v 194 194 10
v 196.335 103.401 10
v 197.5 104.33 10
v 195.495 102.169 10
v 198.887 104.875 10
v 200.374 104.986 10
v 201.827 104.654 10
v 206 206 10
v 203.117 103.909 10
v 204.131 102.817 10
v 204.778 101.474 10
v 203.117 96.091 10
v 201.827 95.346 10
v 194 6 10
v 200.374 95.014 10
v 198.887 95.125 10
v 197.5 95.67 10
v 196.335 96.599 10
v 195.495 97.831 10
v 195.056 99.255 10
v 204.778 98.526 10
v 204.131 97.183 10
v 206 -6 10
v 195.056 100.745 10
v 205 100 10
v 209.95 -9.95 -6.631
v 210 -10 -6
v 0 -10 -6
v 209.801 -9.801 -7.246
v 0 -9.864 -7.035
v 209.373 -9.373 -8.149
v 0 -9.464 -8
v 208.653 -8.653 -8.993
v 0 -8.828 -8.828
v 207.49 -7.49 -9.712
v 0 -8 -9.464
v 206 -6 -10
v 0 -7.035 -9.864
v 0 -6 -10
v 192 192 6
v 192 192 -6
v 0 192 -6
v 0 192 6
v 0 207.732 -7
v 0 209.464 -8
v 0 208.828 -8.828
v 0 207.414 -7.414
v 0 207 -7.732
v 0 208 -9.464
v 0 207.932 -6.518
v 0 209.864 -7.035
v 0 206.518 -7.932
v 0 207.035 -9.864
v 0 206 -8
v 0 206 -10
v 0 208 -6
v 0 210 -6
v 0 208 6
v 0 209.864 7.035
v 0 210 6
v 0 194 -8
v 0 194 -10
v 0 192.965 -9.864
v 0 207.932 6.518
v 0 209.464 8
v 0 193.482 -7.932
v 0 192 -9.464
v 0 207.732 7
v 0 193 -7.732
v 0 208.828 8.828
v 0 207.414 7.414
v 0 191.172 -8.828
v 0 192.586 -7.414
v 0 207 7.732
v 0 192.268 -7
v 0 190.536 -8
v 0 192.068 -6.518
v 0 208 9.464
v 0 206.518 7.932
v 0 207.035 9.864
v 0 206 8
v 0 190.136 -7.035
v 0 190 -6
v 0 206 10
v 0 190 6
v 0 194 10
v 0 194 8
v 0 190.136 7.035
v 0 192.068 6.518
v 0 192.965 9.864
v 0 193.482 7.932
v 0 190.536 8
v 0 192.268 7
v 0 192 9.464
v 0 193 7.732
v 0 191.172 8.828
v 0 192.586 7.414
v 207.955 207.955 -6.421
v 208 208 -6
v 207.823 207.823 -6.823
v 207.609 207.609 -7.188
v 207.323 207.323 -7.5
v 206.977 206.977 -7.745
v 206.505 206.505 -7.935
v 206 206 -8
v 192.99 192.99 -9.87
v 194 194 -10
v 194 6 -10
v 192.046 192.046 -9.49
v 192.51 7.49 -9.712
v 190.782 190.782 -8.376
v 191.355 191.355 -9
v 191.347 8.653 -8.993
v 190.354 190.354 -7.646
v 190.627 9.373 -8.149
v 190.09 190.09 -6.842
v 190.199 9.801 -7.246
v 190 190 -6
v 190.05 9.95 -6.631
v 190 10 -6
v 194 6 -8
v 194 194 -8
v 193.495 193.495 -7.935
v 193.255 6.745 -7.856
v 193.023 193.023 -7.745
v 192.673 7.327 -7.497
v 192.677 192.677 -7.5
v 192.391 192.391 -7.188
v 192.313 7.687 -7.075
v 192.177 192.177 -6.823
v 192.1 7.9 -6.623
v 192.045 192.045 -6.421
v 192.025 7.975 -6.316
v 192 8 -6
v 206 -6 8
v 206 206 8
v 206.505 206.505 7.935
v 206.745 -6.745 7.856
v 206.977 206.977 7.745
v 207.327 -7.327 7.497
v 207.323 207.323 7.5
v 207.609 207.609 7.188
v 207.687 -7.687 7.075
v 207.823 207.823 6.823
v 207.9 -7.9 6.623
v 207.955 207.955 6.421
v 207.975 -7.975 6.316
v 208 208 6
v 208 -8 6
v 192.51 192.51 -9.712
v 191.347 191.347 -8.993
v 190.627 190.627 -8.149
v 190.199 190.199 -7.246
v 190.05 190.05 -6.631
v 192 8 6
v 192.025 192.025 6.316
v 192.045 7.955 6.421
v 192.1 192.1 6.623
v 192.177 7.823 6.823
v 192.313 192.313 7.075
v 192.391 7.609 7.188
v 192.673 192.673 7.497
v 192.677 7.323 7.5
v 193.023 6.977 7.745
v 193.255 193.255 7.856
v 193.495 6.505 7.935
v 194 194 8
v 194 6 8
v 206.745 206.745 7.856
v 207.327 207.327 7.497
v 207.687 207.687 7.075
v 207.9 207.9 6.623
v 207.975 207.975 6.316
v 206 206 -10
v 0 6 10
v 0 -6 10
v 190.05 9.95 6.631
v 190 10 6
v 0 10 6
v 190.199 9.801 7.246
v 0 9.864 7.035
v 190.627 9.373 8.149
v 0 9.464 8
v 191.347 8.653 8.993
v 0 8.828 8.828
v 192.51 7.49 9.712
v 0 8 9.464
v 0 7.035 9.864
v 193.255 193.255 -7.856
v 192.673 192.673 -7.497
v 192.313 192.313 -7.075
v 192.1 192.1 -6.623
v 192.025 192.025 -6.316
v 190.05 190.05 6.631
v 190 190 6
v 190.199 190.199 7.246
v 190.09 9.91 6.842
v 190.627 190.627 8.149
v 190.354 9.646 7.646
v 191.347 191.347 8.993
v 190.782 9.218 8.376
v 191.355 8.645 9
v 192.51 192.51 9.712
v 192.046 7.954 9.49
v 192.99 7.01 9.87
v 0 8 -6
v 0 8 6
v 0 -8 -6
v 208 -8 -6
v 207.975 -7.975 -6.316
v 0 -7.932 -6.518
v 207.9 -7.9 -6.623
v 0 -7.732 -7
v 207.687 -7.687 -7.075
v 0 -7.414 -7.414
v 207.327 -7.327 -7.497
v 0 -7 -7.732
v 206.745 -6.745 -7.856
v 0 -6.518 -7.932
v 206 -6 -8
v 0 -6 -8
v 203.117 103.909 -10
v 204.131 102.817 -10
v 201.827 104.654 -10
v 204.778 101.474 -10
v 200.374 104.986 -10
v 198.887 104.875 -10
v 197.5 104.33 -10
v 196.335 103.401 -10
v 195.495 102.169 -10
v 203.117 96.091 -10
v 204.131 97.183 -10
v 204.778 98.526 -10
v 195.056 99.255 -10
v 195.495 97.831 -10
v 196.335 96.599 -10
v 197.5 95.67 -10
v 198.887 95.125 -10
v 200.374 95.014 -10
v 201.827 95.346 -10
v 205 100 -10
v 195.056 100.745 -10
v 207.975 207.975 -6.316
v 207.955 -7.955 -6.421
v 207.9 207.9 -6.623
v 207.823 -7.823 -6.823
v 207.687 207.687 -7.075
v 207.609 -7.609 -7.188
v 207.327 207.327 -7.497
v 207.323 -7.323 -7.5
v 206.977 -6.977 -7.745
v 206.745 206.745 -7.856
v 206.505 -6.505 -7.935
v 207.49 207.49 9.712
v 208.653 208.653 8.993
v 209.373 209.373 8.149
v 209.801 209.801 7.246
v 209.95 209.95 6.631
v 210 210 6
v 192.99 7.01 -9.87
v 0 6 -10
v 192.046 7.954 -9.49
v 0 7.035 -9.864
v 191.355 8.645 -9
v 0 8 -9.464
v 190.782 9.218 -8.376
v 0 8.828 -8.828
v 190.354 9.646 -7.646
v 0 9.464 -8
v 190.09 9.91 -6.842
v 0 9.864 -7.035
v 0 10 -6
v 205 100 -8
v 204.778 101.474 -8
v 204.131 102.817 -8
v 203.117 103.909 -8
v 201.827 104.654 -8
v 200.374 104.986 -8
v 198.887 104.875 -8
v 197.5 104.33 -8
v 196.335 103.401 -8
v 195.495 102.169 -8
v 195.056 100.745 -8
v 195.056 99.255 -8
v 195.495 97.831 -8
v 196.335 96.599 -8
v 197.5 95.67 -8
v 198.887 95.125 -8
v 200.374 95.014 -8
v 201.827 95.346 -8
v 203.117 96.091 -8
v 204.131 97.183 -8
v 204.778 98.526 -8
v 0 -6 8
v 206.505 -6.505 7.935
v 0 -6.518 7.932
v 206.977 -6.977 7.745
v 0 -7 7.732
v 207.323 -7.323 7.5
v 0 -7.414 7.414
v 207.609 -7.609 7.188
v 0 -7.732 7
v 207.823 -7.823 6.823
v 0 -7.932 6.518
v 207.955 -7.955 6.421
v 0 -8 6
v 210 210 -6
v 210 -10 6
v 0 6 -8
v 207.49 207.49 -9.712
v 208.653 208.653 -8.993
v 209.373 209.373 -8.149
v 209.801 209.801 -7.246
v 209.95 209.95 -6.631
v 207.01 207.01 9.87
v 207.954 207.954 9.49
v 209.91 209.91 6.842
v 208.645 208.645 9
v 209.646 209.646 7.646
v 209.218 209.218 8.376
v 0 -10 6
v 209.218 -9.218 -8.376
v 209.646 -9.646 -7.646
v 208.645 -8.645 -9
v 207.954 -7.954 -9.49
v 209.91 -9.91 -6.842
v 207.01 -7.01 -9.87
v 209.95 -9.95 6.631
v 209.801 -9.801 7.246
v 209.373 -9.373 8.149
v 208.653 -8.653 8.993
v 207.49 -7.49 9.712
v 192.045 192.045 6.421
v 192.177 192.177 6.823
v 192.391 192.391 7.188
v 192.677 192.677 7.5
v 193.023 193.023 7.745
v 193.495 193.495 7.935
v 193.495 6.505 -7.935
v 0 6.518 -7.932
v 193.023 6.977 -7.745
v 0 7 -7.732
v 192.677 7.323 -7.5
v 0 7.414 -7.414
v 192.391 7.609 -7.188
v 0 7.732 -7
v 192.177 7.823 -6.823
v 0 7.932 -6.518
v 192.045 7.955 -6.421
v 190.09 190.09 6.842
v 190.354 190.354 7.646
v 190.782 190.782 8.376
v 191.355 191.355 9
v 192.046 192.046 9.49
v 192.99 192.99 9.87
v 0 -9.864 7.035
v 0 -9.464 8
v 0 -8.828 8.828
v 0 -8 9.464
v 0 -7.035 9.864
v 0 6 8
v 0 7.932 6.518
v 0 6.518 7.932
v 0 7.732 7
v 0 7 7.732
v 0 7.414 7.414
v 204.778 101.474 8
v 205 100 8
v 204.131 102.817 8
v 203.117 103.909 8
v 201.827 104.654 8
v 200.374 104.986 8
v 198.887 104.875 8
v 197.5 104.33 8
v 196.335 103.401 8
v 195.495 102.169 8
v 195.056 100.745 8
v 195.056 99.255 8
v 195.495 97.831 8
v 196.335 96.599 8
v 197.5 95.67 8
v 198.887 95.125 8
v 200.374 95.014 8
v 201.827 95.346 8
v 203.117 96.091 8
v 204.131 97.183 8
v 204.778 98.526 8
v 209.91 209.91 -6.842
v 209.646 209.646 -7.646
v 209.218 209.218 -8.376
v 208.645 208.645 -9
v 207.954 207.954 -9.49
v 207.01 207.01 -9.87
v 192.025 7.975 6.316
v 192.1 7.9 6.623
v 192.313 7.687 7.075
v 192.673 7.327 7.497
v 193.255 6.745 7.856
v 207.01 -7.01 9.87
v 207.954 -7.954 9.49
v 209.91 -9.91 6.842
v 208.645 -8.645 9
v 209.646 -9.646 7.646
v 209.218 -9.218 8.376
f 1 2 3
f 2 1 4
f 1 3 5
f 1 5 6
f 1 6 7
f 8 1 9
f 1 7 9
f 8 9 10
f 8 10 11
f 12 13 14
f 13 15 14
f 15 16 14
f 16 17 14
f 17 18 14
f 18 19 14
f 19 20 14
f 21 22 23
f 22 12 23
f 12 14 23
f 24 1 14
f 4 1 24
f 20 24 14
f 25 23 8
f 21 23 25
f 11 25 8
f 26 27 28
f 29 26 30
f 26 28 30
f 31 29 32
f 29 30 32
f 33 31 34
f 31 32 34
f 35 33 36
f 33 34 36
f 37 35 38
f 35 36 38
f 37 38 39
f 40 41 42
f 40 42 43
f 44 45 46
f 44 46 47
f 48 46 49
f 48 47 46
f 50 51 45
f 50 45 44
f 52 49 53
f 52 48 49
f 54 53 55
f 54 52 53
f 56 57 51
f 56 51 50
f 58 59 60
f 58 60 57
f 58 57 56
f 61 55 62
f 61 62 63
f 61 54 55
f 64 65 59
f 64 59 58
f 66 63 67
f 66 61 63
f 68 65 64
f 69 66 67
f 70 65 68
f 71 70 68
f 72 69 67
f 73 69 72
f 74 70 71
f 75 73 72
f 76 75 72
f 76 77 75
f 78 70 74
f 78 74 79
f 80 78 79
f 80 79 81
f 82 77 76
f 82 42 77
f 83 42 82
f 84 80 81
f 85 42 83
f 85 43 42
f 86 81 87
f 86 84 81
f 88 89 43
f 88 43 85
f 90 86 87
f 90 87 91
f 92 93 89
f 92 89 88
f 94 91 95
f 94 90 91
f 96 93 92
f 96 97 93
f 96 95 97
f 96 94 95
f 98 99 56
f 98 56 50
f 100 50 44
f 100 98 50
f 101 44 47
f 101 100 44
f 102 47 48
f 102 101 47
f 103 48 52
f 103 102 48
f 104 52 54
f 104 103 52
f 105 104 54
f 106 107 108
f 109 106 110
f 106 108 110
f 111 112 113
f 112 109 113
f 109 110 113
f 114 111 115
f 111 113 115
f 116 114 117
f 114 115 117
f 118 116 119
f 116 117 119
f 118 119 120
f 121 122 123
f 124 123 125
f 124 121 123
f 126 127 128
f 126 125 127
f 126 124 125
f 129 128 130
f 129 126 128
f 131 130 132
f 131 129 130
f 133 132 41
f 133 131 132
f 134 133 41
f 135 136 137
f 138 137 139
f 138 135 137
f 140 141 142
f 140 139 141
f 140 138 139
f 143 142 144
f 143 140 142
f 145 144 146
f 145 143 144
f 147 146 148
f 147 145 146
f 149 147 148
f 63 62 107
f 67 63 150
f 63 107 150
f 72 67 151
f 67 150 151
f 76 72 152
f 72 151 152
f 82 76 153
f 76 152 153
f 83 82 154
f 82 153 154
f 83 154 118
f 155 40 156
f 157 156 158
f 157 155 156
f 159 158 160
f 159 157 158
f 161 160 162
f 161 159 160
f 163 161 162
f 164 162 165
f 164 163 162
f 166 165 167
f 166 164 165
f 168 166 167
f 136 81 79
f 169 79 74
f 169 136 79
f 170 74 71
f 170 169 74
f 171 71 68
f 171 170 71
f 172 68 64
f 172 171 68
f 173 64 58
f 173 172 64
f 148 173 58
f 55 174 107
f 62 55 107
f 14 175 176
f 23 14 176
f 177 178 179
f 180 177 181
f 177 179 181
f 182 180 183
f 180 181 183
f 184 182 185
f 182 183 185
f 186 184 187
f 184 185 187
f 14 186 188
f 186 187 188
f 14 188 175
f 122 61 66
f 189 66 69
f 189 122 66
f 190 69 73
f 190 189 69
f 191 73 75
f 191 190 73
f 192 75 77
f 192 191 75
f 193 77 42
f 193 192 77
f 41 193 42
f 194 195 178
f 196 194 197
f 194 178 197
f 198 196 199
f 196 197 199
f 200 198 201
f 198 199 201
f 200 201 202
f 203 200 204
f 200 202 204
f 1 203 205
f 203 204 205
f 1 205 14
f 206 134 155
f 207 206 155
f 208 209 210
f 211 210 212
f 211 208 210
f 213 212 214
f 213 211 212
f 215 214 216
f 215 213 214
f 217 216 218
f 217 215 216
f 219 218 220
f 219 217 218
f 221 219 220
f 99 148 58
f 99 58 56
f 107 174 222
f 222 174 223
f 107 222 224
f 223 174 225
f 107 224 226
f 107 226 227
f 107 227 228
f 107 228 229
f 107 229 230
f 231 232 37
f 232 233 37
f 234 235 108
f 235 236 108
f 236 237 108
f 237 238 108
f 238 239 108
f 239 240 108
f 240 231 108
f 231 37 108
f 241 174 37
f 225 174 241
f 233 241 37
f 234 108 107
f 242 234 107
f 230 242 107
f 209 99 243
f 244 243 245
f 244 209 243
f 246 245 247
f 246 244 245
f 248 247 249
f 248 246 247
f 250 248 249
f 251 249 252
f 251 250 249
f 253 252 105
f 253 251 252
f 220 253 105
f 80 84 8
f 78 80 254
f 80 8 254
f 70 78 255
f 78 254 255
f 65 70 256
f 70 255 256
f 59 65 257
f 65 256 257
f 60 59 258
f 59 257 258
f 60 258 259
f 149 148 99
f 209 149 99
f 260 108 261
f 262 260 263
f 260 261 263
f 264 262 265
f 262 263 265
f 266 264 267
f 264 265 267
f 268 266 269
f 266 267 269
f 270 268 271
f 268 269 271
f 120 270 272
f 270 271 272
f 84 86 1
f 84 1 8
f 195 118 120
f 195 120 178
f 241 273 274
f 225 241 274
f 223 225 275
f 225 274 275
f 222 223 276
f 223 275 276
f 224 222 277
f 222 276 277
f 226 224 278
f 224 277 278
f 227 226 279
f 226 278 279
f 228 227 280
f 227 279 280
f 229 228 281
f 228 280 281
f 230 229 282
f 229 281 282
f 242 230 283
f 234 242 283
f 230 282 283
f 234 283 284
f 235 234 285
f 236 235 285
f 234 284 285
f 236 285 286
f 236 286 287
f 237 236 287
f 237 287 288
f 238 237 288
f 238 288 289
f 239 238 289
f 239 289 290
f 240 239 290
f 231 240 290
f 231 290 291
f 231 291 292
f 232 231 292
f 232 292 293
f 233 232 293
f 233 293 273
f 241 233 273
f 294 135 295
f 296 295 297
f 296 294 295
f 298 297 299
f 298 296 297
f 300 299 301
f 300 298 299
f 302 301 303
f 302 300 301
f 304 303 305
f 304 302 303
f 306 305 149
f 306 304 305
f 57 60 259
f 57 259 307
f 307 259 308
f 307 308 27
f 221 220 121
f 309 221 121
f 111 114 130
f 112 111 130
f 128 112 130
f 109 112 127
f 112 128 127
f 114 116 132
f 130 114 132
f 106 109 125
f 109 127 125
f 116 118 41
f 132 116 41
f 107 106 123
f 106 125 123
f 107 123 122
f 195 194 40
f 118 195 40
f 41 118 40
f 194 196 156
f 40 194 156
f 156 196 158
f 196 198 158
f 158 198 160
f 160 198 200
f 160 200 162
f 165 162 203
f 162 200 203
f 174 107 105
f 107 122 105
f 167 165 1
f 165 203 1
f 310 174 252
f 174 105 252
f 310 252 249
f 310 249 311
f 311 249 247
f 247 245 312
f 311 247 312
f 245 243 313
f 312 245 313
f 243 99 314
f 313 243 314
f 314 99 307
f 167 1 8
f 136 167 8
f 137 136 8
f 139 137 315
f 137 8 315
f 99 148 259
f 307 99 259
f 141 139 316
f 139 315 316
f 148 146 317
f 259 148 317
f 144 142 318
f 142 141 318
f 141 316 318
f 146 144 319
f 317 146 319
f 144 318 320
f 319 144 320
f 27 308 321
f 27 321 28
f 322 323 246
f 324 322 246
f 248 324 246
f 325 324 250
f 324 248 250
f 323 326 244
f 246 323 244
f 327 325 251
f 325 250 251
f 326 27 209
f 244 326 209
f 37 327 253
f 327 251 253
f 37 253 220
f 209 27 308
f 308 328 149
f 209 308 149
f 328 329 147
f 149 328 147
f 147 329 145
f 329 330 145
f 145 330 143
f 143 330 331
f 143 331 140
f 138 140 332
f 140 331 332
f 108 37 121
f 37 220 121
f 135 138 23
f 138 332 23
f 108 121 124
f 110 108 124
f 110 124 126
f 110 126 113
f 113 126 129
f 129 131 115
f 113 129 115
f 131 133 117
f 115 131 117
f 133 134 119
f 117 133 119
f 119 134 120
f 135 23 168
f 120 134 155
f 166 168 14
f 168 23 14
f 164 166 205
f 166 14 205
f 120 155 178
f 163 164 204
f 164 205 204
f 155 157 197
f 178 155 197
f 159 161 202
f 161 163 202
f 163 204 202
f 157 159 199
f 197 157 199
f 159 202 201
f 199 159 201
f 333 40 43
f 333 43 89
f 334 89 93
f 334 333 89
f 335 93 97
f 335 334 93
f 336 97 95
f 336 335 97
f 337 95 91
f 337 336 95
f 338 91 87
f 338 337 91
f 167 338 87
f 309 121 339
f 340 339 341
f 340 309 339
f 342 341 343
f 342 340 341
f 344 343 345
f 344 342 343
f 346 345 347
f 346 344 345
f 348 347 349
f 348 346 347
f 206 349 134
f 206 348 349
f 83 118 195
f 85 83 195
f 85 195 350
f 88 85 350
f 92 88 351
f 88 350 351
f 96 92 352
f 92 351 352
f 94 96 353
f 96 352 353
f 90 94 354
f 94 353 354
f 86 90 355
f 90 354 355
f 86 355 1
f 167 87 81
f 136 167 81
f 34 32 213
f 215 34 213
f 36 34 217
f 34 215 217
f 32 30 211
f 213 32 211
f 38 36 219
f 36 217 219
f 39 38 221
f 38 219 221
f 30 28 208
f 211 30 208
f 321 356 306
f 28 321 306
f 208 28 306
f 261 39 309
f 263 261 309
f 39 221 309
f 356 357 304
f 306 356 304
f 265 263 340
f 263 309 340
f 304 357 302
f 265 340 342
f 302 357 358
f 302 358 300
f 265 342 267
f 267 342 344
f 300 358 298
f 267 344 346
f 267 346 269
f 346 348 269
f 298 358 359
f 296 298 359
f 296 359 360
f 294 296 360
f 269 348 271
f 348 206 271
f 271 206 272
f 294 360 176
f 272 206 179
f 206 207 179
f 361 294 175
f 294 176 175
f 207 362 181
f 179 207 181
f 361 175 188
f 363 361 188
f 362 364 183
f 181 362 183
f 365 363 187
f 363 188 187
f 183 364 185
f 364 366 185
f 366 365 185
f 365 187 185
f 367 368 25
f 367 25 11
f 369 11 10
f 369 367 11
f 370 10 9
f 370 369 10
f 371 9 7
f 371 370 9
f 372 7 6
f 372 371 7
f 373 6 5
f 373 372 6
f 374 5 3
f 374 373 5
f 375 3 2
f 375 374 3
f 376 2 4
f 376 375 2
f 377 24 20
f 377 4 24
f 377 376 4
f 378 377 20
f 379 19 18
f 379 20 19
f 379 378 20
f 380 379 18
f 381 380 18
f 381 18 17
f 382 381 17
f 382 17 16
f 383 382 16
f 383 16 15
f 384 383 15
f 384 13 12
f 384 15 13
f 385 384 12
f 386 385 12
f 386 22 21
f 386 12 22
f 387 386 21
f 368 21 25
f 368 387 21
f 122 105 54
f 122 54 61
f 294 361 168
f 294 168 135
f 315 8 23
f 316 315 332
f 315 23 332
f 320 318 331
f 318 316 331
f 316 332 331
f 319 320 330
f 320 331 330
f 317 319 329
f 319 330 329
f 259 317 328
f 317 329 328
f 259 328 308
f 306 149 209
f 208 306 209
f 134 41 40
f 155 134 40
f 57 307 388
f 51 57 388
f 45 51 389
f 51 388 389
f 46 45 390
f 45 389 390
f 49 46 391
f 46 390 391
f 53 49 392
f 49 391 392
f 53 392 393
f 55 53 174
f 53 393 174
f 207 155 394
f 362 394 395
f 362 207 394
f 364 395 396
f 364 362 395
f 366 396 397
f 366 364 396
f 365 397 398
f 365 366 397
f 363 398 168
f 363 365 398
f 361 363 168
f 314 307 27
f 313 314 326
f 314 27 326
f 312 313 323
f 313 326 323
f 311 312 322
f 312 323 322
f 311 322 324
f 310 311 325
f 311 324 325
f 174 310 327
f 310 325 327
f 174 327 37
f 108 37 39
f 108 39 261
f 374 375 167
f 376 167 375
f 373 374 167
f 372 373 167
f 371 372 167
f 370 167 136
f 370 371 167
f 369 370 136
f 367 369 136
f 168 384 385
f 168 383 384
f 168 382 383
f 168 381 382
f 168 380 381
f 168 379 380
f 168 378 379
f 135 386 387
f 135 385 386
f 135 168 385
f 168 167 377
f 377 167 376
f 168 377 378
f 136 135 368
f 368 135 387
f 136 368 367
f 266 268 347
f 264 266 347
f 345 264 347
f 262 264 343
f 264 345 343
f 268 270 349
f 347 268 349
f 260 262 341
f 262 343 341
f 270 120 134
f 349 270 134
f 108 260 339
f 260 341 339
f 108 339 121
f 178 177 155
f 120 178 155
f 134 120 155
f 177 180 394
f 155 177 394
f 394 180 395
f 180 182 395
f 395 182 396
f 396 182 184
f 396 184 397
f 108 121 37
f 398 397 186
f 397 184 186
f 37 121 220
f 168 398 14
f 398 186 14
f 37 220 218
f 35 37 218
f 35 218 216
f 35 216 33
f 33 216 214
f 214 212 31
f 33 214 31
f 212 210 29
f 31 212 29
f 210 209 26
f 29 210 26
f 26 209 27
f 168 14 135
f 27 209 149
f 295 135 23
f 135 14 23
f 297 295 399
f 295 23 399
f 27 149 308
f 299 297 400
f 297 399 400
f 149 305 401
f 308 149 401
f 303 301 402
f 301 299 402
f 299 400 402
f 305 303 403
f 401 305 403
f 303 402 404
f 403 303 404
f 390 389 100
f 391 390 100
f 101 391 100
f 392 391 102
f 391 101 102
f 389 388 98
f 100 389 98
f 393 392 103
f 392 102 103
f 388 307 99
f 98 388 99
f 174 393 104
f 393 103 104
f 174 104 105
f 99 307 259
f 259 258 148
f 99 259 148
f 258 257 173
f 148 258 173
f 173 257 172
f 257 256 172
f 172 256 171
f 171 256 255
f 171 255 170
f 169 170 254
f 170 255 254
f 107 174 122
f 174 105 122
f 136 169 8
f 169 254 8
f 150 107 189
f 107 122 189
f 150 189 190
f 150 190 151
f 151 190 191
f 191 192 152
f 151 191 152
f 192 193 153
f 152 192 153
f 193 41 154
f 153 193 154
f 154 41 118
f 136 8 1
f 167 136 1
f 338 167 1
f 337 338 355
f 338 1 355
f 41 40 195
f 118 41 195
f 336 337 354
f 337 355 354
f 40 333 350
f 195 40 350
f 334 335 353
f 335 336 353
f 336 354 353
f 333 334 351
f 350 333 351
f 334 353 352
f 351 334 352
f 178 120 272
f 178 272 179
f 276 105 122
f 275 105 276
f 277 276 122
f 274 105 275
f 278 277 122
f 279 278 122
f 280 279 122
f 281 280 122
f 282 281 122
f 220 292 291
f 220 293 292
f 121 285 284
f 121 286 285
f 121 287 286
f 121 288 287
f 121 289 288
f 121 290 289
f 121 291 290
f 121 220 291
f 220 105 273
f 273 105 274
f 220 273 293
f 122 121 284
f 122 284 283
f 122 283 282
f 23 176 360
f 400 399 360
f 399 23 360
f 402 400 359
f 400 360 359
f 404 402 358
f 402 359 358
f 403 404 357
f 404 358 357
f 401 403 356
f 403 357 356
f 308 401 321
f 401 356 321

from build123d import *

# Parameters (mm, degrees)
SQUARE_TUBE_20_X_20_X_2_1_DEPTH   = 215.142135624
SQUARE_TUBE_20_X_20_X_2_1_2_DEPTH = 230.284271247
SQUARE_TUBE_20_X_20_X_2_1_3_DEPTH = 215.142135624
SKETCH12_R                        = 5
CUT_EXTRUDE1_DEPTH                = 298.153159162
CUT_EXTRUDE1_DEPTH_BACK           = 298.153159162


with BuildPart() as part:
    # Sketch11 → Square tube 20 X 20 X 2(1) (new body)
    with BuildSketch(Plane.YZ):
        with BuildLine():
            Line((-6, -10), (6, -10))
            ThreePointArc((6, -10), (8.828427125, -8.828427125), (10, -6))
            Line((10, -6), (10, 6))
            ThreePointArc((10, 6), (8.828427125, 8.828427125), (6, 10))
            Line((6, 10), (-6, 10))
            ThreePointArc((-6, 10), (-8.828427125, 8.828427125), (-10, 6))
            Line((-10, 6), (-10, -6))
            ThreePointArc((-10, -6), (-8.828427125, -8.828427125), (-6, -10))
        make_face()
        with BuildLine():
            Line((-6, -8), (6, -8))
            ThreePointArc((6, -8), (7.414213562, -7.414213562), (8, -6))
            Line((8, -6), (8, 6))
            ThreePointArc((8, 6), (7.414213562, 7.414213562), (6, 8))
            Line((6, 8), (-6, 8))
            ThreePointArc((-6, 8), (-7.414213562, 7.414213562), (-8, 6))
            Line((-8, 6), (-8, -6))
            ThreePointArc((-8, -6), (-7.414213562, -7.414213562), (-6, -8))
        make_face(mode=Mode.SUBTRACT)
    extrude(amount=SQUARE_TUBE_20_X_20_X_2_1_DEPTH)

    # Square tube 20 X 20 X 2(1) mitre 1
    split(bisect_by=Plane(origin=(200, 0, 0), x_dir=(0.707106781, -0.707106781, 0), z_dir=(-0.707106781, -0.707106781, 0)), keep=Keep.TOP)


with BuildPart() as body_2:
    # Sketch11 on segment 2 (carried to segment 2) → Square tube 20 X 20 X 2_1 2 (new body)
    with BuildSketch(Plane(origin=(200, -15.142135624, 0), x_dir=(-1, 0, 0), z_dir=(0, 1, 0))):
        with BuildLine():
            Line((-6, -10), (6, -10))
            ThreePointArc((6, -10), (8.828427125, -8.828427125), (10, -6))
            Line((10, -6), (10, 6))
            ThreePointArc((10, 6), (8.828427125, 8.828427125), (6, 10))
            Line((6, 10), (-6, 10))
            ThreePointArc((-6, 10), (-8.828427125, 8.828427125), (-10, 6))
            Line((-10, 6), (-10, -6))
            ThreePointArc((-10, -6), (-8.828427125, -8.828427125), (-6, -10))
        make_face()
        with BuildLine():
            Line((-6, -8), (6, -8))
            ThreePointArc((6, -8), (7.414213562, -7.414213562), (8, -6))
            Line((8, -6), (8, 6))
            ThreePointArc((8, 6), (7.414213562, 7.414213562), (6, 8))
            Line((6, 8), (-6, 8))
            ThreePointArc((-6, 8), (-7.414213562, 7.414213562), (-8, 6))
            Line((-8, 6), (-8, -6))
            ThreePointArc((-8, -6), (-7.414213562, -7.414213562), (-6, -8))
        make_face(mode=Mode.SUBTRACT)
    extrude(amount=SQUARE_TUBE_20_X_20_X_2_1_2_DEPTH)

    # Square tube 20 X 20 X 2_1 2 mitre 1
    split(bisect_by=Plane(origin=(200, 0, 0), x_dir=(-0.707106781, 0.707106781, 0), z_dir=(0.707106781, 0.707106781, 0)), keep=Keep.TOP)

    # Square tube 20 X 20 X 2_1 2 mitre 2
    split(bisect_by=Plane(origin=(200, 200, 0), x_dir=(0.707106781, 0.707106781, 0), z_dir=(0.707106781, -0.707106781, 0)), keep=Keep.TOP)

    # Sketch12 → Cut-Extrude1 (cut, two sides)
    with BuildSketch(Plane.XY) as cut_extrude1_sk:
        with Locations((200, 100)):
            Circle(SKETCH12_R)
    extrude(amount=CUT_EXTRUDE1_DEPTH, mode=Mode.SUBTRACT)
    extrude(cut_extrude1_sk.sketch, amount=-CUT_EXTRUDE1_DEPTH_BACK, mode=Mode.SUBTRACT)


with BuildPart() as body_3:
    # Sketch11 on segment 3 (carried to segment 3) → Square tube 20 X 20 X 2_1 3 (new body)
    with BuildSketch(Plane(origin=(215.142135624, 200, 0), x_dir=(0, -1, 0), z_dir=(-1, 0, 0))):
        with BuildLine():
            Line((-6, -10), (6, -10))
            ThreePointArc((6, -10), (8.828427125, -8.828427125), (10, -6))
            Line((10, -6), (10, 6))
            ThreePointArc((10, 6), (8.828427125, 8.828427125), (6, 10))
            Line((6, 10), (-6, 10))
            ThreePointArc((-6, 10), (-8.828427125, 8.828427125), (-10, 6))
            Line((-10, 6), (-10, -6))
            ThreePointArc((-10, -6), (-8.828427125, -8.828427125), (-6, -10))
        make_face()
        with BuildLine():
            Line((-6, -8), (6, -8))
            ThreePointArc((6, -8), (7.414213562, -7.414213562), (8, -6))
            Line((8, -6), (8, 6))
            ThreePointArc((8, 6), (7.414213562, 7.414213562), (6, 8))
            Line((6, 8), (-6, 8))
            ThreePointArc((-6, 8), (-7.414213562, 7.414213562), (-8, 6))
            Line((-8, 6), (-8, -6))
            ThreePointArc((-8, -6), (-7.414213562, -7.414213562), (-6, -8))
        make_face(mode=Mode.SUBTRACT)
    extrude(amount=SQUARE_TUBE_20_X_20_X_2_1_3_DEPTH)

    # Square tube 20 X 20 X 2_1 3 mitre 1
    split(bisect_by=Plane(origin=(200, 200, 0), x_dir=(-0.707106781, -0.707106781, 0), z_dir=(-0.707106781, 0.707106781, 0)), keep=Keep.TOP)


solid = Compound([part.part, body_2.part, body_3.part])
